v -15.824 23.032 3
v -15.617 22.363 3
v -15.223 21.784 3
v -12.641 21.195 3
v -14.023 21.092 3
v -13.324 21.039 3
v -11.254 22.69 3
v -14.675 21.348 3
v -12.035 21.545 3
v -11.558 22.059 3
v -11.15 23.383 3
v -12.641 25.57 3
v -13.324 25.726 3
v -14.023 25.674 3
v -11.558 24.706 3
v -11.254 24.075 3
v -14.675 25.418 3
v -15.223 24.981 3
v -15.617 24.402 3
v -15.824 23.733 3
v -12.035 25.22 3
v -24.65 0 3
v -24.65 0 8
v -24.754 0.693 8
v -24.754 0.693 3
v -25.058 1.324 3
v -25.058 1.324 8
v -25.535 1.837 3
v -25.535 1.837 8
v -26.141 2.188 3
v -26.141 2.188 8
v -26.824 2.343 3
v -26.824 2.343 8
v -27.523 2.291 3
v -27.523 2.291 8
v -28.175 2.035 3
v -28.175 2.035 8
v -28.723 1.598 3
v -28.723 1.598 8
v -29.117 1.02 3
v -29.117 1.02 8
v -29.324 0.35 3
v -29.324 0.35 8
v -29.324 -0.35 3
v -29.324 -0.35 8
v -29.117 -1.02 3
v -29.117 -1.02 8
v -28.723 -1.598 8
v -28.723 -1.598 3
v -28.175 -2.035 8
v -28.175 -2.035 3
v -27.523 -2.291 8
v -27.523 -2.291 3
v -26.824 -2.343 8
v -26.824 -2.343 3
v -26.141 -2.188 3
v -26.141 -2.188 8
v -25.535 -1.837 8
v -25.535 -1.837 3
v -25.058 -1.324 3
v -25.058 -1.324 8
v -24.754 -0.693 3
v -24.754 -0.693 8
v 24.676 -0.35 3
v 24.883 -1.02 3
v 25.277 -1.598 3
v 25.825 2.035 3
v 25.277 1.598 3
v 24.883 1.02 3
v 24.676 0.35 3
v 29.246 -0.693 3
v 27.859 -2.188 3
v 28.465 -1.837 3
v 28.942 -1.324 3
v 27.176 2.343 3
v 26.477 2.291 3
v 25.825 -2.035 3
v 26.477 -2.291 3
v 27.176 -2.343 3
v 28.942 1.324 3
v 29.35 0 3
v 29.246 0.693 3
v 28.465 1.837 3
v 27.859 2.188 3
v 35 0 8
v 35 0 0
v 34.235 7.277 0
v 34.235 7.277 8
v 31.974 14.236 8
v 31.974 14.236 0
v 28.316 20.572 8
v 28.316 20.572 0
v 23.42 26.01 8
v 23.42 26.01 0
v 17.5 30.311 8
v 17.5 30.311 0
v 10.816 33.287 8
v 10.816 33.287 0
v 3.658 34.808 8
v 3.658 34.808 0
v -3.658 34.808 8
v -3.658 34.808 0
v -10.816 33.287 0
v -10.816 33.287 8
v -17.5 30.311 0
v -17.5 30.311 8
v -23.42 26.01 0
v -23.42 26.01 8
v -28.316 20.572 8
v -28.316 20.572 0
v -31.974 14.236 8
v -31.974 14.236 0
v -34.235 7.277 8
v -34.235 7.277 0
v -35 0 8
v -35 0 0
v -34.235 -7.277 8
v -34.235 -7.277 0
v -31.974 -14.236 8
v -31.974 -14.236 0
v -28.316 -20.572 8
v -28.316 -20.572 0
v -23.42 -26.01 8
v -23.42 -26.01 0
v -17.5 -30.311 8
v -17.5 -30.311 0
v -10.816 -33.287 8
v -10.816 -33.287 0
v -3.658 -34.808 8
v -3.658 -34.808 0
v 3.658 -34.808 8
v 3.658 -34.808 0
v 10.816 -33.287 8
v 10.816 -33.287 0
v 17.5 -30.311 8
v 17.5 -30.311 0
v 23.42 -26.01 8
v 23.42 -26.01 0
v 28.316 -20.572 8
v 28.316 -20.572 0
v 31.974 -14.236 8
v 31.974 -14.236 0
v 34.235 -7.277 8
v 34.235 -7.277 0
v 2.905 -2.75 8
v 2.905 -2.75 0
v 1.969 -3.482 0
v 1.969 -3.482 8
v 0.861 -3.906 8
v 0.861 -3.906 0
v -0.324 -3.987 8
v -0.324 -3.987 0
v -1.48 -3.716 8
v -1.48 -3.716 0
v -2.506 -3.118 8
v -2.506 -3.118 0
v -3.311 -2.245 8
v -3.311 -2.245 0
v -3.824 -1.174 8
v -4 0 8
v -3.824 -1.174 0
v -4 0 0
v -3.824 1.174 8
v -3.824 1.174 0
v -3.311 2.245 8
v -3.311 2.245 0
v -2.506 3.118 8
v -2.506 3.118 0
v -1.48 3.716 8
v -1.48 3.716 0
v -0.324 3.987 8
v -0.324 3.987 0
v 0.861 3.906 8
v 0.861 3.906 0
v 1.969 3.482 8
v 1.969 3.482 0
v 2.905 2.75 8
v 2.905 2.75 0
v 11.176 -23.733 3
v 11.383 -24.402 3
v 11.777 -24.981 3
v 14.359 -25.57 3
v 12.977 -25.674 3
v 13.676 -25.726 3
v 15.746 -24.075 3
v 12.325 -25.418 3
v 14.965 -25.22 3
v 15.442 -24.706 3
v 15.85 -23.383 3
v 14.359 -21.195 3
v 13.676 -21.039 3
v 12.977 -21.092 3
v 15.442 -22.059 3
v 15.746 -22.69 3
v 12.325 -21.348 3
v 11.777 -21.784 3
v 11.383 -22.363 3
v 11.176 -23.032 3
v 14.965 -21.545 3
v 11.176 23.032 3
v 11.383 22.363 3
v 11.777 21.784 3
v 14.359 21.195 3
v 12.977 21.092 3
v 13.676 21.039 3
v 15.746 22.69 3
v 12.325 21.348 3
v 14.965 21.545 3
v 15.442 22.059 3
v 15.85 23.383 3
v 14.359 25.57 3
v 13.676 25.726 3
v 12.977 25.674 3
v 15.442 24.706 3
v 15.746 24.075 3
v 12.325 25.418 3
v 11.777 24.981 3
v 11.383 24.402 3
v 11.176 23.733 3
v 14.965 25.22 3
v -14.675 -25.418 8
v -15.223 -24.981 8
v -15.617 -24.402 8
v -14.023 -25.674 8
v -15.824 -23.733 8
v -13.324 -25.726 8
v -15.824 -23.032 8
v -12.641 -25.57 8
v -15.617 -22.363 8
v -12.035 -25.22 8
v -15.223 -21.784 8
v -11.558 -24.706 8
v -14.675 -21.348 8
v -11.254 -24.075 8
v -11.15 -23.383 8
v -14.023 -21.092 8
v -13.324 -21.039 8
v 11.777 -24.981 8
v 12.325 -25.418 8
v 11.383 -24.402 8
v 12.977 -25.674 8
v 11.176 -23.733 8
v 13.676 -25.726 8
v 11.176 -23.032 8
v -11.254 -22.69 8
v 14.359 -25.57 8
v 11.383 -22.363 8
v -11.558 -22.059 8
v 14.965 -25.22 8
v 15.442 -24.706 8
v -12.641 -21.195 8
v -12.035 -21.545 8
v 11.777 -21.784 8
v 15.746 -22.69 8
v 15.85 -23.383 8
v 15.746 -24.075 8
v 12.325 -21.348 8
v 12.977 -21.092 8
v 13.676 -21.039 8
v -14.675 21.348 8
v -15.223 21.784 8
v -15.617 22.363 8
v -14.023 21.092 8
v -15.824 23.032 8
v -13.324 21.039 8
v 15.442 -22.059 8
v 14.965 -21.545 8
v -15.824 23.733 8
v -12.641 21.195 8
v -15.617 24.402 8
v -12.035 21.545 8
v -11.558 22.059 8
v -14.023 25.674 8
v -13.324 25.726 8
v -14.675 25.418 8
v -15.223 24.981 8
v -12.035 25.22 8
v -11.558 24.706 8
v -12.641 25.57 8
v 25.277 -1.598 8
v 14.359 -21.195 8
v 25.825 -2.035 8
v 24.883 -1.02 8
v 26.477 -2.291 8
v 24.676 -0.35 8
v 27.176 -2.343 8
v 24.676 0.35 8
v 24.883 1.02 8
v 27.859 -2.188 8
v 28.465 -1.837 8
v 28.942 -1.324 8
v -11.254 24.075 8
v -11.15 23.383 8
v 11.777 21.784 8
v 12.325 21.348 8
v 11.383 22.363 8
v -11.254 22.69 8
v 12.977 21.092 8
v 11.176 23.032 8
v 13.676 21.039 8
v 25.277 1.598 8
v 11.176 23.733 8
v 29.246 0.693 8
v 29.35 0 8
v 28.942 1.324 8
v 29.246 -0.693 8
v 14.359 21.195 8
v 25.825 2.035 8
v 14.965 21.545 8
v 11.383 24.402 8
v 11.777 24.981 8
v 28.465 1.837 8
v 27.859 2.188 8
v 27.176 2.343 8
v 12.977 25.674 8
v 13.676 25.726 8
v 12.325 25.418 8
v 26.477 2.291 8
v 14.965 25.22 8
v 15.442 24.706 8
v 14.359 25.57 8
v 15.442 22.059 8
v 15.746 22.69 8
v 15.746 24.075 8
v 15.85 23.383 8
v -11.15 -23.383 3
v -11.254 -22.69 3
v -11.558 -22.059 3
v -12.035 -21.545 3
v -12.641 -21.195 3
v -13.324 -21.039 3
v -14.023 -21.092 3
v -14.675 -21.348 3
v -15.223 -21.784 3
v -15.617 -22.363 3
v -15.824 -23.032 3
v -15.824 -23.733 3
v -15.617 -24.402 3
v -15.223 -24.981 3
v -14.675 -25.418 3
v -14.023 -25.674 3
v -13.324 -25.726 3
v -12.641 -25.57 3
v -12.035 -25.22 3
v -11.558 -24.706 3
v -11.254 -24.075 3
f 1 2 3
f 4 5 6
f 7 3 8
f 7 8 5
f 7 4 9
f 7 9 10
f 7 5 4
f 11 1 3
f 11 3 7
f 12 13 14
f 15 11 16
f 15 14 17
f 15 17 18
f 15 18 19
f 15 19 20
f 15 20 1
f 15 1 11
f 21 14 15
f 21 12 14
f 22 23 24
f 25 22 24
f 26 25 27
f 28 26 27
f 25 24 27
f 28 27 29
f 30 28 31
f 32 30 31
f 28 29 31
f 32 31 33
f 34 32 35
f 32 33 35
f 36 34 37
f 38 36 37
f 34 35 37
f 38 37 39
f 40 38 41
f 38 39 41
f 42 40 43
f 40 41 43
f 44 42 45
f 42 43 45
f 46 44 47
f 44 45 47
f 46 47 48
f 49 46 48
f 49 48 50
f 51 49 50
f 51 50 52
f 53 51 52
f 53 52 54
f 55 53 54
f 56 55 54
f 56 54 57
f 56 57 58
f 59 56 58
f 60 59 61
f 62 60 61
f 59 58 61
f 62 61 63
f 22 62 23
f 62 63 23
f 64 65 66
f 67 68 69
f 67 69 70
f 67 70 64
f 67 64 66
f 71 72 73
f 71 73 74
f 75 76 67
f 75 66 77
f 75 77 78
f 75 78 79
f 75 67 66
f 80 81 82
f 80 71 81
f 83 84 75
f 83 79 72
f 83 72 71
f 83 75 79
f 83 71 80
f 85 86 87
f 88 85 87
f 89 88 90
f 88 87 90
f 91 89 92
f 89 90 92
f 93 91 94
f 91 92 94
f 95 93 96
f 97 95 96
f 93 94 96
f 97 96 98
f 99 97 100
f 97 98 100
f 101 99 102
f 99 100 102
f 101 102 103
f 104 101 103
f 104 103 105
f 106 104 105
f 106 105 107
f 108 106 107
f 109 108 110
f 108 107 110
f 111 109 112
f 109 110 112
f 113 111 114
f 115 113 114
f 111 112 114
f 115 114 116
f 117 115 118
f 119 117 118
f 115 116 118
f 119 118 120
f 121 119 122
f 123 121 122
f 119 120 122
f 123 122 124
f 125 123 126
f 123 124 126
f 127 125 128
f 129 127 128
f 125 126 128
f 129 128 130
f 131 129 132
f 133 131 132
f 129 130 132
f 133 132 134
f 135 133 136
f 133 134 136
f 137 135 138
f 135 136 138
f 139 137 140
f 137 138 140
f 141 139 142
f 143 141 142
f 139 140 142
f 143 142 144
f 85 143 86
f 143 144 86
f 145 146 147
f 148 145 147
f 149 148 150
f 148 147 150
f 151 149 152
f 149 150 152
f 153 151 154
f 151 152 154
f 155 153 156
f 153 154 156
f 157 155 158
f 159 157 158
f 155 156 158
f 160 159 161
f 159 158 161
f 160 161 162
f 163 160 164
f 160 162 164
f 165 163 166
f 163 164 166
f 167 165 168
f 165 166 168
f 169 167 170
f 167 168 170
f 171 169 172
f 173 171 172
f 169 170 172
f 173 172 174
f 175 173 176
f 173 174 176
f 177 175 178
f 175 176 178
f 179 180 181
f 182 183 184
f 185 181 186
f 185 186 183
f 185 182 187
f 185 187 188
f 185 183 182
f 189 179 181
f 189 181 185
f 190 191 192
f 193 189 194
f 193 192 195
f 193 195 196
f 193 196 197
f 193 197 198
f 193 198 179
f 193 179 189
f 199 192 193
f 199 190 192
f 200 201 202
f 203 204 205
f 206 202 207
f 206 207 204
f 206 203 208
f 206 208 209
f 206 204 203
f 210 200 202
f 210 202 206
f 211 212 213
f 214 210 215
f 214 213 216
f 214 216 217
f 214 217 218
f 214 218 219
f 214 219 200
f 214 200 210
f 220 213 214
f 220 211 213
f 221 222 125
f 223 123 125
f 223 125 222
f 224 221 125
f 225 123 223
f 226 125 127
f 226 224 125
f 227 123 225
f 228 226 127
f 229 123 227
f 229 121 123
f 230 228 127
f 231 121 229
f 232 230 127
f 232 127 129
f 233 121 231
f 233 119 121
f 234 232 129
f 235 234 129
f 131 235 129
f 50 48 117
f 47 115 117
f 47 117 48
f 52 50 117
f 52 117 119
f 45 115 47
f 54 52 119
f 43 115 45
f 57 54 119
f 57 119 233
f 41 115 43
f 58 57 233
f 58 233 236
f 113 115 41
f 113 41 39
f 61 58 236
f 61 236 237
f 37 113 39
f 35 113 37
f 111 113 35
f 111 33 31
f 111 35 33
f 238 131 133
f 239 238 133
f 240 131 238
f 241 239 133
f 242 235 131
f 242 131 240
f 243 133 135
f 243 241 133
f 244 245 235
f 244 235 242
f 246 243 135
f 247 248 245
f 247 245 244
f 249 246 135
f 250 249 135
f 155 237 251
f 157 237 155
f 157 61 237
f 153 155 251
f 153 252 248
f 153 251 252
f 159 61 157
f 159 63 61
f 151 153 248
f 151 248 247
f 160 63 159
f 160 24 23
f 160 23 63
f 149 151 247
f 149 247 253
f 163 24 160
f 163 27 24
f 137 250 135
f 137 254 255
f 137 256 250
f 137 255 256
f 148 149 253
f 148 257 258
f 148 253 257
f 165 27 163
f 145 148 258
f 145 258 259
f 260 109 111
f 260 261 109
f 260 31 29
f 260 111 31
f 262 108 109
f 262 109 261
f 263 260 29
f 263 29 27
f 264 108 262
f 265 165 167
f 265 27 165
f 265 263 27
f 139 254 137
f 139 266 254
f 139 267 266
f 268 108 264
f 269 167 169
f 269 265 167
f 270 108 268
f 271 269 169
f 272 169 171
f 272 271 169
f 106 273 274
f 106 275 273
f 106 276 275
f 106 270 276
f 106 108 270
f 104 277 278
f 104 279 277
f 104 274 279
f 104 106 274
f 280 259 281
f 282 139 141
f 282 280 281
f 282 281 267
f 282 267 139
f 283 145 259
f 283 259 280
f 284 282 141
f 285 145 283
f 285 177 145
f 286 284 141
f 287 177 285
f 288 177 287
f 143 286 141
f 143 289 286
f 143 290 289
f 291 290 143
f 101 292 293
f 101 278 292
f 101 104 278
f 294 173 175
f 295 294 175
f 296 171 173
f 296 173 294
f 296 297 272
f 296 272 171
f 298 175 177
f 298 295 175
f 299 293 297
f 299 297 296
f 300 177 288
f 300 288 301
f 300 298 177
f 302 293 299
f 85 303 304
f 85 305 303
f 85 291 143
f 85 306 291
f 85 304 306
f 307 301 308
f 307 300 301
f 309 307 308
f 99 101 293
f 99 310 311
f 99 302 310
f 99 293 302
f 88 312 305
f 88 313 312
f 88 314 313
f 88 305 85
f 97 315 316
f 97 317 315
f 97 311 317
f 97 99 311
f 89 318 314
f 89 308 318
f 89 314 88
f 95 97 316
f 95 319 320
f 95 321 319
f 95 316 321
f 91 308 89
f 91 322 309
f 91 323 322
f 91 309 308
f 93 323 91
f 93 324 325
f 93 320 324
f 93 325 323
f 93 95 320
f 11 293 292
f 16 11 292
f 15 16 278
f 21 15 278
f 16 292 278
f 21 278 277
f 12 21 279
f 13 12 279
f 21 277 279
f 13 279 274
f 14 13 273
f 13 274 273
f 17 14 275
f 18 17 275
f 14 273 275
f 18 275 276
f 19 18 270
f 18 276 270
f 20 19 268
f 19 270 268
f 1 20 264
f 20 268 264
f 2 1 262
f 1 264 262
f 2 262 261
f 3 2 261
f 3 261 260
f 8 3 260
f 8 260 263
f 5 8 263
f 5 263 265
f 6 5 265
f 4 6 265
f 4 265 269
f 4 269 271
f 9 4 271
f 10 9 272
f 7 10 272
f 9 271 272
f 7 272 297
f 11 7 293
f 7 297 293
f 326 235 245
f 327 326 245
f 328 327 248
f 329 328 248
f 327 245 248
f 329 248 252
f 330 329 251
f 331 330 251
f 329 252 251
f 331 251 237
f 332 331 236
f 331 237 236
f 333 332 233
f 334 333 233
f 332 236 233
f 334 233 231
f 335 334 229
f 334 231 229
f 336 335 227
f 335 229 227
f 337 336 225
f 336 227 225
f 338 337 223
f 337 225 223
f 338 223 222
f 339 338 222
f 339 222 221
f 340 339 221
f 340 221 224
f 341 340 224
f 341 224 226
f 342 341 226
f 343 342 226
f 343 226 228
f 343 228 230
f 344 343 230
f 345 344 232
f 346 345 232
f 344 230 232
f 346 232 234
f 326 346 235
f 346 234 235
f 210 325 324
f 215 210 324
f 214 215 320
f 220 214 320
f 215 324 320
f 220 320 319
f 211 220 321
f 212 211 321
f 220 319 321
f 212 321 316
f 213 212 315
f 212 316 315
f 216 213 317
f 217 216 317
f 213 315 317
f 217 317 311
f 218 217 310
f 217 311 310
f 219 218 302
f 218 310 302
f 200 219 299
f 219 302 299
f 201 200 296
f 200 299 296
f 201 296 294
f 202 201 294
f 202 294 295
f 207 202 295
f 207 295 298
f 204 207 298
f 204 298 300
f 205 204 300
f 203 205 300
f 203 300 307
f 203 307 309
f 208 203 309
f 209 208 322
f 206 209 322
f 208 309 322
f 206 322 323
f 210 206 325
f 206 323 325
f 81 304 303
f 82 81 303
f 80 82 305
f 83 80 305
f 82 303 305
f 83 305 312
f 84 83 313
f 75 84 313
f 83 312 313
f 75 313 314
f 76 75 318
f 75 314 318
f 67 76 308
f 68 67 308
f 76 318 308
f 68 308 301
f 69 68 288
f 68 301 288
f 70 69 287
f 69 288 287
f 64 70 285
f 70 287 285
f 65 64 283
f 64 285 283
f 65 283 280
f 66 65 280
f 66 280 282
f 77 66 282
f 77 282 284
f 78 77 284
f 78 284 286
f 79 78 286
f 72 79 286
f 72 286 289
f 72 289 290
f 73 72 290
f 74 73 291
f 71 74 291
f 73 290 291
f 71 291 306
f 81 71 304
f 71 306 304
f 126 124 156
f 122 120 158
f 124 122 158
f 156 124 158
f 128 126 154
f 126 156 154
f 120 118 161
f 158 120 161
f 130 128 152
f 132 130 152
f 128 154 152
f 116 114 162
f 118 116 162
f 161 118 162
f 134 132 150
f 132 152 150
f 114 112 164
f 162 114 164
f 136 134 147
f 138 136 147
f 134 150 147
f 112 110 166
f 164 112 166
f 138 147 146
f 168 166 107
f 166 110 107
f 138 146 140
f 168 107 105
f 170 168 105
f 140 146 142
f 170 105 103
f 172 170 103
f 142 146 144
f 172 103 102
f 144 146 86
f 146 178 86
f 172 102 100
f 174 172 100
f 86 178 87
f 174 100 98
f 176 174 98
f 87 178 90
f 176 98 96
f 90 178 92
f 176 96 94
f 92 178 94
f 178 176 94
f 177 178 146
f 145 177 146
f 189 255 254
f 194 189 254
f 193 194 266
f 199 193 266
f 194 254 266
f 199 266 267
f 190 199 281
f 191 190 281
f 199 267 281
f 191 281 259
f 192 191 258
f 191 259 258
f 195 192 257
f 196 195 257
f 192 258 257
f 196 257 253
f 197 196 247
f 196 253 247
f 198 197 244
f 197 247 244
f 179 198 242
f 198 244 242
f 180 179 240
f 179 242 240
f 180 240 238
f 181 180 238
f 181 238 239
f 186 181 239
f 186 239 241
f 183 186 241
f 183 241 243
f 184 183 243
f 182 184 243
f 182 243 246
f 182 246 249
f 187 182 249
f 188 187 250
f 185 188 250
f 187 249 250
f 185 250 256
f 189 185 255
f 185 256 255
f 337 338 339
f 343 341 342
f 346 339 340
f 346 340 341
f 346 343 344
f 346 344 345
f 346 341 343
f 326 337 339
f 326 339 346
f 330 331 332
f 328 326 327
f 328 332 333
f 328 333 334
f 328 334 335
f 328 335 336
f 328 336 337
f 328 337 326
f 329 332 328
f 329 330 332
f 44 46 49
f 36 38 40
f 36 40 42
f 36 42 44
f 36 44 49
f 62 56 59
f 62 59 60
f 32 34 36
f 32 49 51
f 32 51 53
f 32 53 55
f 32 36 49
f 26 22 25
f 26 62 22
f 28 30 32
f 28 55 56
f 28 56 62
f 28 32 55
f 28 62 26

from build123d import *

# Parameters (mm, degrees)
CROQUIS1_R              = 35
SALIENTE_EXTRUIR1_DEPTH = 8
CROQUIS2_R              = 2.35
CORTAR_EXTRUIR1_DEPTH   = 5


with BuildPart() as part:
    # Croquis1 → Saliente-Extruir1 (new body)
    with BuildSketch(Plane.XY):
        Circle(CROQUIS1_R)
        with BuildLine():
            Line((2.90473751, 2.75), (2.90473751, -2.75))
            ThreePointArc((2.90473751, -2.75), (-4, 0), (2.90473751, 2.75))
        make_face(mode=Mode.SUBTRACT)
    extrude(amount=SALIENTE_EXTRUIR1_DEPTH)

    # Croquis2 → Cortar-Extruir1 (cut)
    with BuildSketch(Plane.XY.offset(8)):
        with Locations((27, 0)):
            Circle(CROQUIS2_R)
        with Locations((13.5, -23.382685902)):
            Circle(CROQUIS2_R)
        with Locations((-13.5, -23.382685902)):
            Circle(CROQUIS2_R)
        with Locations((-27, 0)):
            Circle(CROQUIS2_R)
        with Locations((-13.5, 23.382685902)):
            Circle(CROQUIS2_R)
        with Locations((13.5, 23.382685902)):
            Circle(CROQUIS2_R)
    extrude(amount=-CORTAR_EXTRUIR1_DEPTH, mode=Mode.SUBTRACT)


solid = part.part
